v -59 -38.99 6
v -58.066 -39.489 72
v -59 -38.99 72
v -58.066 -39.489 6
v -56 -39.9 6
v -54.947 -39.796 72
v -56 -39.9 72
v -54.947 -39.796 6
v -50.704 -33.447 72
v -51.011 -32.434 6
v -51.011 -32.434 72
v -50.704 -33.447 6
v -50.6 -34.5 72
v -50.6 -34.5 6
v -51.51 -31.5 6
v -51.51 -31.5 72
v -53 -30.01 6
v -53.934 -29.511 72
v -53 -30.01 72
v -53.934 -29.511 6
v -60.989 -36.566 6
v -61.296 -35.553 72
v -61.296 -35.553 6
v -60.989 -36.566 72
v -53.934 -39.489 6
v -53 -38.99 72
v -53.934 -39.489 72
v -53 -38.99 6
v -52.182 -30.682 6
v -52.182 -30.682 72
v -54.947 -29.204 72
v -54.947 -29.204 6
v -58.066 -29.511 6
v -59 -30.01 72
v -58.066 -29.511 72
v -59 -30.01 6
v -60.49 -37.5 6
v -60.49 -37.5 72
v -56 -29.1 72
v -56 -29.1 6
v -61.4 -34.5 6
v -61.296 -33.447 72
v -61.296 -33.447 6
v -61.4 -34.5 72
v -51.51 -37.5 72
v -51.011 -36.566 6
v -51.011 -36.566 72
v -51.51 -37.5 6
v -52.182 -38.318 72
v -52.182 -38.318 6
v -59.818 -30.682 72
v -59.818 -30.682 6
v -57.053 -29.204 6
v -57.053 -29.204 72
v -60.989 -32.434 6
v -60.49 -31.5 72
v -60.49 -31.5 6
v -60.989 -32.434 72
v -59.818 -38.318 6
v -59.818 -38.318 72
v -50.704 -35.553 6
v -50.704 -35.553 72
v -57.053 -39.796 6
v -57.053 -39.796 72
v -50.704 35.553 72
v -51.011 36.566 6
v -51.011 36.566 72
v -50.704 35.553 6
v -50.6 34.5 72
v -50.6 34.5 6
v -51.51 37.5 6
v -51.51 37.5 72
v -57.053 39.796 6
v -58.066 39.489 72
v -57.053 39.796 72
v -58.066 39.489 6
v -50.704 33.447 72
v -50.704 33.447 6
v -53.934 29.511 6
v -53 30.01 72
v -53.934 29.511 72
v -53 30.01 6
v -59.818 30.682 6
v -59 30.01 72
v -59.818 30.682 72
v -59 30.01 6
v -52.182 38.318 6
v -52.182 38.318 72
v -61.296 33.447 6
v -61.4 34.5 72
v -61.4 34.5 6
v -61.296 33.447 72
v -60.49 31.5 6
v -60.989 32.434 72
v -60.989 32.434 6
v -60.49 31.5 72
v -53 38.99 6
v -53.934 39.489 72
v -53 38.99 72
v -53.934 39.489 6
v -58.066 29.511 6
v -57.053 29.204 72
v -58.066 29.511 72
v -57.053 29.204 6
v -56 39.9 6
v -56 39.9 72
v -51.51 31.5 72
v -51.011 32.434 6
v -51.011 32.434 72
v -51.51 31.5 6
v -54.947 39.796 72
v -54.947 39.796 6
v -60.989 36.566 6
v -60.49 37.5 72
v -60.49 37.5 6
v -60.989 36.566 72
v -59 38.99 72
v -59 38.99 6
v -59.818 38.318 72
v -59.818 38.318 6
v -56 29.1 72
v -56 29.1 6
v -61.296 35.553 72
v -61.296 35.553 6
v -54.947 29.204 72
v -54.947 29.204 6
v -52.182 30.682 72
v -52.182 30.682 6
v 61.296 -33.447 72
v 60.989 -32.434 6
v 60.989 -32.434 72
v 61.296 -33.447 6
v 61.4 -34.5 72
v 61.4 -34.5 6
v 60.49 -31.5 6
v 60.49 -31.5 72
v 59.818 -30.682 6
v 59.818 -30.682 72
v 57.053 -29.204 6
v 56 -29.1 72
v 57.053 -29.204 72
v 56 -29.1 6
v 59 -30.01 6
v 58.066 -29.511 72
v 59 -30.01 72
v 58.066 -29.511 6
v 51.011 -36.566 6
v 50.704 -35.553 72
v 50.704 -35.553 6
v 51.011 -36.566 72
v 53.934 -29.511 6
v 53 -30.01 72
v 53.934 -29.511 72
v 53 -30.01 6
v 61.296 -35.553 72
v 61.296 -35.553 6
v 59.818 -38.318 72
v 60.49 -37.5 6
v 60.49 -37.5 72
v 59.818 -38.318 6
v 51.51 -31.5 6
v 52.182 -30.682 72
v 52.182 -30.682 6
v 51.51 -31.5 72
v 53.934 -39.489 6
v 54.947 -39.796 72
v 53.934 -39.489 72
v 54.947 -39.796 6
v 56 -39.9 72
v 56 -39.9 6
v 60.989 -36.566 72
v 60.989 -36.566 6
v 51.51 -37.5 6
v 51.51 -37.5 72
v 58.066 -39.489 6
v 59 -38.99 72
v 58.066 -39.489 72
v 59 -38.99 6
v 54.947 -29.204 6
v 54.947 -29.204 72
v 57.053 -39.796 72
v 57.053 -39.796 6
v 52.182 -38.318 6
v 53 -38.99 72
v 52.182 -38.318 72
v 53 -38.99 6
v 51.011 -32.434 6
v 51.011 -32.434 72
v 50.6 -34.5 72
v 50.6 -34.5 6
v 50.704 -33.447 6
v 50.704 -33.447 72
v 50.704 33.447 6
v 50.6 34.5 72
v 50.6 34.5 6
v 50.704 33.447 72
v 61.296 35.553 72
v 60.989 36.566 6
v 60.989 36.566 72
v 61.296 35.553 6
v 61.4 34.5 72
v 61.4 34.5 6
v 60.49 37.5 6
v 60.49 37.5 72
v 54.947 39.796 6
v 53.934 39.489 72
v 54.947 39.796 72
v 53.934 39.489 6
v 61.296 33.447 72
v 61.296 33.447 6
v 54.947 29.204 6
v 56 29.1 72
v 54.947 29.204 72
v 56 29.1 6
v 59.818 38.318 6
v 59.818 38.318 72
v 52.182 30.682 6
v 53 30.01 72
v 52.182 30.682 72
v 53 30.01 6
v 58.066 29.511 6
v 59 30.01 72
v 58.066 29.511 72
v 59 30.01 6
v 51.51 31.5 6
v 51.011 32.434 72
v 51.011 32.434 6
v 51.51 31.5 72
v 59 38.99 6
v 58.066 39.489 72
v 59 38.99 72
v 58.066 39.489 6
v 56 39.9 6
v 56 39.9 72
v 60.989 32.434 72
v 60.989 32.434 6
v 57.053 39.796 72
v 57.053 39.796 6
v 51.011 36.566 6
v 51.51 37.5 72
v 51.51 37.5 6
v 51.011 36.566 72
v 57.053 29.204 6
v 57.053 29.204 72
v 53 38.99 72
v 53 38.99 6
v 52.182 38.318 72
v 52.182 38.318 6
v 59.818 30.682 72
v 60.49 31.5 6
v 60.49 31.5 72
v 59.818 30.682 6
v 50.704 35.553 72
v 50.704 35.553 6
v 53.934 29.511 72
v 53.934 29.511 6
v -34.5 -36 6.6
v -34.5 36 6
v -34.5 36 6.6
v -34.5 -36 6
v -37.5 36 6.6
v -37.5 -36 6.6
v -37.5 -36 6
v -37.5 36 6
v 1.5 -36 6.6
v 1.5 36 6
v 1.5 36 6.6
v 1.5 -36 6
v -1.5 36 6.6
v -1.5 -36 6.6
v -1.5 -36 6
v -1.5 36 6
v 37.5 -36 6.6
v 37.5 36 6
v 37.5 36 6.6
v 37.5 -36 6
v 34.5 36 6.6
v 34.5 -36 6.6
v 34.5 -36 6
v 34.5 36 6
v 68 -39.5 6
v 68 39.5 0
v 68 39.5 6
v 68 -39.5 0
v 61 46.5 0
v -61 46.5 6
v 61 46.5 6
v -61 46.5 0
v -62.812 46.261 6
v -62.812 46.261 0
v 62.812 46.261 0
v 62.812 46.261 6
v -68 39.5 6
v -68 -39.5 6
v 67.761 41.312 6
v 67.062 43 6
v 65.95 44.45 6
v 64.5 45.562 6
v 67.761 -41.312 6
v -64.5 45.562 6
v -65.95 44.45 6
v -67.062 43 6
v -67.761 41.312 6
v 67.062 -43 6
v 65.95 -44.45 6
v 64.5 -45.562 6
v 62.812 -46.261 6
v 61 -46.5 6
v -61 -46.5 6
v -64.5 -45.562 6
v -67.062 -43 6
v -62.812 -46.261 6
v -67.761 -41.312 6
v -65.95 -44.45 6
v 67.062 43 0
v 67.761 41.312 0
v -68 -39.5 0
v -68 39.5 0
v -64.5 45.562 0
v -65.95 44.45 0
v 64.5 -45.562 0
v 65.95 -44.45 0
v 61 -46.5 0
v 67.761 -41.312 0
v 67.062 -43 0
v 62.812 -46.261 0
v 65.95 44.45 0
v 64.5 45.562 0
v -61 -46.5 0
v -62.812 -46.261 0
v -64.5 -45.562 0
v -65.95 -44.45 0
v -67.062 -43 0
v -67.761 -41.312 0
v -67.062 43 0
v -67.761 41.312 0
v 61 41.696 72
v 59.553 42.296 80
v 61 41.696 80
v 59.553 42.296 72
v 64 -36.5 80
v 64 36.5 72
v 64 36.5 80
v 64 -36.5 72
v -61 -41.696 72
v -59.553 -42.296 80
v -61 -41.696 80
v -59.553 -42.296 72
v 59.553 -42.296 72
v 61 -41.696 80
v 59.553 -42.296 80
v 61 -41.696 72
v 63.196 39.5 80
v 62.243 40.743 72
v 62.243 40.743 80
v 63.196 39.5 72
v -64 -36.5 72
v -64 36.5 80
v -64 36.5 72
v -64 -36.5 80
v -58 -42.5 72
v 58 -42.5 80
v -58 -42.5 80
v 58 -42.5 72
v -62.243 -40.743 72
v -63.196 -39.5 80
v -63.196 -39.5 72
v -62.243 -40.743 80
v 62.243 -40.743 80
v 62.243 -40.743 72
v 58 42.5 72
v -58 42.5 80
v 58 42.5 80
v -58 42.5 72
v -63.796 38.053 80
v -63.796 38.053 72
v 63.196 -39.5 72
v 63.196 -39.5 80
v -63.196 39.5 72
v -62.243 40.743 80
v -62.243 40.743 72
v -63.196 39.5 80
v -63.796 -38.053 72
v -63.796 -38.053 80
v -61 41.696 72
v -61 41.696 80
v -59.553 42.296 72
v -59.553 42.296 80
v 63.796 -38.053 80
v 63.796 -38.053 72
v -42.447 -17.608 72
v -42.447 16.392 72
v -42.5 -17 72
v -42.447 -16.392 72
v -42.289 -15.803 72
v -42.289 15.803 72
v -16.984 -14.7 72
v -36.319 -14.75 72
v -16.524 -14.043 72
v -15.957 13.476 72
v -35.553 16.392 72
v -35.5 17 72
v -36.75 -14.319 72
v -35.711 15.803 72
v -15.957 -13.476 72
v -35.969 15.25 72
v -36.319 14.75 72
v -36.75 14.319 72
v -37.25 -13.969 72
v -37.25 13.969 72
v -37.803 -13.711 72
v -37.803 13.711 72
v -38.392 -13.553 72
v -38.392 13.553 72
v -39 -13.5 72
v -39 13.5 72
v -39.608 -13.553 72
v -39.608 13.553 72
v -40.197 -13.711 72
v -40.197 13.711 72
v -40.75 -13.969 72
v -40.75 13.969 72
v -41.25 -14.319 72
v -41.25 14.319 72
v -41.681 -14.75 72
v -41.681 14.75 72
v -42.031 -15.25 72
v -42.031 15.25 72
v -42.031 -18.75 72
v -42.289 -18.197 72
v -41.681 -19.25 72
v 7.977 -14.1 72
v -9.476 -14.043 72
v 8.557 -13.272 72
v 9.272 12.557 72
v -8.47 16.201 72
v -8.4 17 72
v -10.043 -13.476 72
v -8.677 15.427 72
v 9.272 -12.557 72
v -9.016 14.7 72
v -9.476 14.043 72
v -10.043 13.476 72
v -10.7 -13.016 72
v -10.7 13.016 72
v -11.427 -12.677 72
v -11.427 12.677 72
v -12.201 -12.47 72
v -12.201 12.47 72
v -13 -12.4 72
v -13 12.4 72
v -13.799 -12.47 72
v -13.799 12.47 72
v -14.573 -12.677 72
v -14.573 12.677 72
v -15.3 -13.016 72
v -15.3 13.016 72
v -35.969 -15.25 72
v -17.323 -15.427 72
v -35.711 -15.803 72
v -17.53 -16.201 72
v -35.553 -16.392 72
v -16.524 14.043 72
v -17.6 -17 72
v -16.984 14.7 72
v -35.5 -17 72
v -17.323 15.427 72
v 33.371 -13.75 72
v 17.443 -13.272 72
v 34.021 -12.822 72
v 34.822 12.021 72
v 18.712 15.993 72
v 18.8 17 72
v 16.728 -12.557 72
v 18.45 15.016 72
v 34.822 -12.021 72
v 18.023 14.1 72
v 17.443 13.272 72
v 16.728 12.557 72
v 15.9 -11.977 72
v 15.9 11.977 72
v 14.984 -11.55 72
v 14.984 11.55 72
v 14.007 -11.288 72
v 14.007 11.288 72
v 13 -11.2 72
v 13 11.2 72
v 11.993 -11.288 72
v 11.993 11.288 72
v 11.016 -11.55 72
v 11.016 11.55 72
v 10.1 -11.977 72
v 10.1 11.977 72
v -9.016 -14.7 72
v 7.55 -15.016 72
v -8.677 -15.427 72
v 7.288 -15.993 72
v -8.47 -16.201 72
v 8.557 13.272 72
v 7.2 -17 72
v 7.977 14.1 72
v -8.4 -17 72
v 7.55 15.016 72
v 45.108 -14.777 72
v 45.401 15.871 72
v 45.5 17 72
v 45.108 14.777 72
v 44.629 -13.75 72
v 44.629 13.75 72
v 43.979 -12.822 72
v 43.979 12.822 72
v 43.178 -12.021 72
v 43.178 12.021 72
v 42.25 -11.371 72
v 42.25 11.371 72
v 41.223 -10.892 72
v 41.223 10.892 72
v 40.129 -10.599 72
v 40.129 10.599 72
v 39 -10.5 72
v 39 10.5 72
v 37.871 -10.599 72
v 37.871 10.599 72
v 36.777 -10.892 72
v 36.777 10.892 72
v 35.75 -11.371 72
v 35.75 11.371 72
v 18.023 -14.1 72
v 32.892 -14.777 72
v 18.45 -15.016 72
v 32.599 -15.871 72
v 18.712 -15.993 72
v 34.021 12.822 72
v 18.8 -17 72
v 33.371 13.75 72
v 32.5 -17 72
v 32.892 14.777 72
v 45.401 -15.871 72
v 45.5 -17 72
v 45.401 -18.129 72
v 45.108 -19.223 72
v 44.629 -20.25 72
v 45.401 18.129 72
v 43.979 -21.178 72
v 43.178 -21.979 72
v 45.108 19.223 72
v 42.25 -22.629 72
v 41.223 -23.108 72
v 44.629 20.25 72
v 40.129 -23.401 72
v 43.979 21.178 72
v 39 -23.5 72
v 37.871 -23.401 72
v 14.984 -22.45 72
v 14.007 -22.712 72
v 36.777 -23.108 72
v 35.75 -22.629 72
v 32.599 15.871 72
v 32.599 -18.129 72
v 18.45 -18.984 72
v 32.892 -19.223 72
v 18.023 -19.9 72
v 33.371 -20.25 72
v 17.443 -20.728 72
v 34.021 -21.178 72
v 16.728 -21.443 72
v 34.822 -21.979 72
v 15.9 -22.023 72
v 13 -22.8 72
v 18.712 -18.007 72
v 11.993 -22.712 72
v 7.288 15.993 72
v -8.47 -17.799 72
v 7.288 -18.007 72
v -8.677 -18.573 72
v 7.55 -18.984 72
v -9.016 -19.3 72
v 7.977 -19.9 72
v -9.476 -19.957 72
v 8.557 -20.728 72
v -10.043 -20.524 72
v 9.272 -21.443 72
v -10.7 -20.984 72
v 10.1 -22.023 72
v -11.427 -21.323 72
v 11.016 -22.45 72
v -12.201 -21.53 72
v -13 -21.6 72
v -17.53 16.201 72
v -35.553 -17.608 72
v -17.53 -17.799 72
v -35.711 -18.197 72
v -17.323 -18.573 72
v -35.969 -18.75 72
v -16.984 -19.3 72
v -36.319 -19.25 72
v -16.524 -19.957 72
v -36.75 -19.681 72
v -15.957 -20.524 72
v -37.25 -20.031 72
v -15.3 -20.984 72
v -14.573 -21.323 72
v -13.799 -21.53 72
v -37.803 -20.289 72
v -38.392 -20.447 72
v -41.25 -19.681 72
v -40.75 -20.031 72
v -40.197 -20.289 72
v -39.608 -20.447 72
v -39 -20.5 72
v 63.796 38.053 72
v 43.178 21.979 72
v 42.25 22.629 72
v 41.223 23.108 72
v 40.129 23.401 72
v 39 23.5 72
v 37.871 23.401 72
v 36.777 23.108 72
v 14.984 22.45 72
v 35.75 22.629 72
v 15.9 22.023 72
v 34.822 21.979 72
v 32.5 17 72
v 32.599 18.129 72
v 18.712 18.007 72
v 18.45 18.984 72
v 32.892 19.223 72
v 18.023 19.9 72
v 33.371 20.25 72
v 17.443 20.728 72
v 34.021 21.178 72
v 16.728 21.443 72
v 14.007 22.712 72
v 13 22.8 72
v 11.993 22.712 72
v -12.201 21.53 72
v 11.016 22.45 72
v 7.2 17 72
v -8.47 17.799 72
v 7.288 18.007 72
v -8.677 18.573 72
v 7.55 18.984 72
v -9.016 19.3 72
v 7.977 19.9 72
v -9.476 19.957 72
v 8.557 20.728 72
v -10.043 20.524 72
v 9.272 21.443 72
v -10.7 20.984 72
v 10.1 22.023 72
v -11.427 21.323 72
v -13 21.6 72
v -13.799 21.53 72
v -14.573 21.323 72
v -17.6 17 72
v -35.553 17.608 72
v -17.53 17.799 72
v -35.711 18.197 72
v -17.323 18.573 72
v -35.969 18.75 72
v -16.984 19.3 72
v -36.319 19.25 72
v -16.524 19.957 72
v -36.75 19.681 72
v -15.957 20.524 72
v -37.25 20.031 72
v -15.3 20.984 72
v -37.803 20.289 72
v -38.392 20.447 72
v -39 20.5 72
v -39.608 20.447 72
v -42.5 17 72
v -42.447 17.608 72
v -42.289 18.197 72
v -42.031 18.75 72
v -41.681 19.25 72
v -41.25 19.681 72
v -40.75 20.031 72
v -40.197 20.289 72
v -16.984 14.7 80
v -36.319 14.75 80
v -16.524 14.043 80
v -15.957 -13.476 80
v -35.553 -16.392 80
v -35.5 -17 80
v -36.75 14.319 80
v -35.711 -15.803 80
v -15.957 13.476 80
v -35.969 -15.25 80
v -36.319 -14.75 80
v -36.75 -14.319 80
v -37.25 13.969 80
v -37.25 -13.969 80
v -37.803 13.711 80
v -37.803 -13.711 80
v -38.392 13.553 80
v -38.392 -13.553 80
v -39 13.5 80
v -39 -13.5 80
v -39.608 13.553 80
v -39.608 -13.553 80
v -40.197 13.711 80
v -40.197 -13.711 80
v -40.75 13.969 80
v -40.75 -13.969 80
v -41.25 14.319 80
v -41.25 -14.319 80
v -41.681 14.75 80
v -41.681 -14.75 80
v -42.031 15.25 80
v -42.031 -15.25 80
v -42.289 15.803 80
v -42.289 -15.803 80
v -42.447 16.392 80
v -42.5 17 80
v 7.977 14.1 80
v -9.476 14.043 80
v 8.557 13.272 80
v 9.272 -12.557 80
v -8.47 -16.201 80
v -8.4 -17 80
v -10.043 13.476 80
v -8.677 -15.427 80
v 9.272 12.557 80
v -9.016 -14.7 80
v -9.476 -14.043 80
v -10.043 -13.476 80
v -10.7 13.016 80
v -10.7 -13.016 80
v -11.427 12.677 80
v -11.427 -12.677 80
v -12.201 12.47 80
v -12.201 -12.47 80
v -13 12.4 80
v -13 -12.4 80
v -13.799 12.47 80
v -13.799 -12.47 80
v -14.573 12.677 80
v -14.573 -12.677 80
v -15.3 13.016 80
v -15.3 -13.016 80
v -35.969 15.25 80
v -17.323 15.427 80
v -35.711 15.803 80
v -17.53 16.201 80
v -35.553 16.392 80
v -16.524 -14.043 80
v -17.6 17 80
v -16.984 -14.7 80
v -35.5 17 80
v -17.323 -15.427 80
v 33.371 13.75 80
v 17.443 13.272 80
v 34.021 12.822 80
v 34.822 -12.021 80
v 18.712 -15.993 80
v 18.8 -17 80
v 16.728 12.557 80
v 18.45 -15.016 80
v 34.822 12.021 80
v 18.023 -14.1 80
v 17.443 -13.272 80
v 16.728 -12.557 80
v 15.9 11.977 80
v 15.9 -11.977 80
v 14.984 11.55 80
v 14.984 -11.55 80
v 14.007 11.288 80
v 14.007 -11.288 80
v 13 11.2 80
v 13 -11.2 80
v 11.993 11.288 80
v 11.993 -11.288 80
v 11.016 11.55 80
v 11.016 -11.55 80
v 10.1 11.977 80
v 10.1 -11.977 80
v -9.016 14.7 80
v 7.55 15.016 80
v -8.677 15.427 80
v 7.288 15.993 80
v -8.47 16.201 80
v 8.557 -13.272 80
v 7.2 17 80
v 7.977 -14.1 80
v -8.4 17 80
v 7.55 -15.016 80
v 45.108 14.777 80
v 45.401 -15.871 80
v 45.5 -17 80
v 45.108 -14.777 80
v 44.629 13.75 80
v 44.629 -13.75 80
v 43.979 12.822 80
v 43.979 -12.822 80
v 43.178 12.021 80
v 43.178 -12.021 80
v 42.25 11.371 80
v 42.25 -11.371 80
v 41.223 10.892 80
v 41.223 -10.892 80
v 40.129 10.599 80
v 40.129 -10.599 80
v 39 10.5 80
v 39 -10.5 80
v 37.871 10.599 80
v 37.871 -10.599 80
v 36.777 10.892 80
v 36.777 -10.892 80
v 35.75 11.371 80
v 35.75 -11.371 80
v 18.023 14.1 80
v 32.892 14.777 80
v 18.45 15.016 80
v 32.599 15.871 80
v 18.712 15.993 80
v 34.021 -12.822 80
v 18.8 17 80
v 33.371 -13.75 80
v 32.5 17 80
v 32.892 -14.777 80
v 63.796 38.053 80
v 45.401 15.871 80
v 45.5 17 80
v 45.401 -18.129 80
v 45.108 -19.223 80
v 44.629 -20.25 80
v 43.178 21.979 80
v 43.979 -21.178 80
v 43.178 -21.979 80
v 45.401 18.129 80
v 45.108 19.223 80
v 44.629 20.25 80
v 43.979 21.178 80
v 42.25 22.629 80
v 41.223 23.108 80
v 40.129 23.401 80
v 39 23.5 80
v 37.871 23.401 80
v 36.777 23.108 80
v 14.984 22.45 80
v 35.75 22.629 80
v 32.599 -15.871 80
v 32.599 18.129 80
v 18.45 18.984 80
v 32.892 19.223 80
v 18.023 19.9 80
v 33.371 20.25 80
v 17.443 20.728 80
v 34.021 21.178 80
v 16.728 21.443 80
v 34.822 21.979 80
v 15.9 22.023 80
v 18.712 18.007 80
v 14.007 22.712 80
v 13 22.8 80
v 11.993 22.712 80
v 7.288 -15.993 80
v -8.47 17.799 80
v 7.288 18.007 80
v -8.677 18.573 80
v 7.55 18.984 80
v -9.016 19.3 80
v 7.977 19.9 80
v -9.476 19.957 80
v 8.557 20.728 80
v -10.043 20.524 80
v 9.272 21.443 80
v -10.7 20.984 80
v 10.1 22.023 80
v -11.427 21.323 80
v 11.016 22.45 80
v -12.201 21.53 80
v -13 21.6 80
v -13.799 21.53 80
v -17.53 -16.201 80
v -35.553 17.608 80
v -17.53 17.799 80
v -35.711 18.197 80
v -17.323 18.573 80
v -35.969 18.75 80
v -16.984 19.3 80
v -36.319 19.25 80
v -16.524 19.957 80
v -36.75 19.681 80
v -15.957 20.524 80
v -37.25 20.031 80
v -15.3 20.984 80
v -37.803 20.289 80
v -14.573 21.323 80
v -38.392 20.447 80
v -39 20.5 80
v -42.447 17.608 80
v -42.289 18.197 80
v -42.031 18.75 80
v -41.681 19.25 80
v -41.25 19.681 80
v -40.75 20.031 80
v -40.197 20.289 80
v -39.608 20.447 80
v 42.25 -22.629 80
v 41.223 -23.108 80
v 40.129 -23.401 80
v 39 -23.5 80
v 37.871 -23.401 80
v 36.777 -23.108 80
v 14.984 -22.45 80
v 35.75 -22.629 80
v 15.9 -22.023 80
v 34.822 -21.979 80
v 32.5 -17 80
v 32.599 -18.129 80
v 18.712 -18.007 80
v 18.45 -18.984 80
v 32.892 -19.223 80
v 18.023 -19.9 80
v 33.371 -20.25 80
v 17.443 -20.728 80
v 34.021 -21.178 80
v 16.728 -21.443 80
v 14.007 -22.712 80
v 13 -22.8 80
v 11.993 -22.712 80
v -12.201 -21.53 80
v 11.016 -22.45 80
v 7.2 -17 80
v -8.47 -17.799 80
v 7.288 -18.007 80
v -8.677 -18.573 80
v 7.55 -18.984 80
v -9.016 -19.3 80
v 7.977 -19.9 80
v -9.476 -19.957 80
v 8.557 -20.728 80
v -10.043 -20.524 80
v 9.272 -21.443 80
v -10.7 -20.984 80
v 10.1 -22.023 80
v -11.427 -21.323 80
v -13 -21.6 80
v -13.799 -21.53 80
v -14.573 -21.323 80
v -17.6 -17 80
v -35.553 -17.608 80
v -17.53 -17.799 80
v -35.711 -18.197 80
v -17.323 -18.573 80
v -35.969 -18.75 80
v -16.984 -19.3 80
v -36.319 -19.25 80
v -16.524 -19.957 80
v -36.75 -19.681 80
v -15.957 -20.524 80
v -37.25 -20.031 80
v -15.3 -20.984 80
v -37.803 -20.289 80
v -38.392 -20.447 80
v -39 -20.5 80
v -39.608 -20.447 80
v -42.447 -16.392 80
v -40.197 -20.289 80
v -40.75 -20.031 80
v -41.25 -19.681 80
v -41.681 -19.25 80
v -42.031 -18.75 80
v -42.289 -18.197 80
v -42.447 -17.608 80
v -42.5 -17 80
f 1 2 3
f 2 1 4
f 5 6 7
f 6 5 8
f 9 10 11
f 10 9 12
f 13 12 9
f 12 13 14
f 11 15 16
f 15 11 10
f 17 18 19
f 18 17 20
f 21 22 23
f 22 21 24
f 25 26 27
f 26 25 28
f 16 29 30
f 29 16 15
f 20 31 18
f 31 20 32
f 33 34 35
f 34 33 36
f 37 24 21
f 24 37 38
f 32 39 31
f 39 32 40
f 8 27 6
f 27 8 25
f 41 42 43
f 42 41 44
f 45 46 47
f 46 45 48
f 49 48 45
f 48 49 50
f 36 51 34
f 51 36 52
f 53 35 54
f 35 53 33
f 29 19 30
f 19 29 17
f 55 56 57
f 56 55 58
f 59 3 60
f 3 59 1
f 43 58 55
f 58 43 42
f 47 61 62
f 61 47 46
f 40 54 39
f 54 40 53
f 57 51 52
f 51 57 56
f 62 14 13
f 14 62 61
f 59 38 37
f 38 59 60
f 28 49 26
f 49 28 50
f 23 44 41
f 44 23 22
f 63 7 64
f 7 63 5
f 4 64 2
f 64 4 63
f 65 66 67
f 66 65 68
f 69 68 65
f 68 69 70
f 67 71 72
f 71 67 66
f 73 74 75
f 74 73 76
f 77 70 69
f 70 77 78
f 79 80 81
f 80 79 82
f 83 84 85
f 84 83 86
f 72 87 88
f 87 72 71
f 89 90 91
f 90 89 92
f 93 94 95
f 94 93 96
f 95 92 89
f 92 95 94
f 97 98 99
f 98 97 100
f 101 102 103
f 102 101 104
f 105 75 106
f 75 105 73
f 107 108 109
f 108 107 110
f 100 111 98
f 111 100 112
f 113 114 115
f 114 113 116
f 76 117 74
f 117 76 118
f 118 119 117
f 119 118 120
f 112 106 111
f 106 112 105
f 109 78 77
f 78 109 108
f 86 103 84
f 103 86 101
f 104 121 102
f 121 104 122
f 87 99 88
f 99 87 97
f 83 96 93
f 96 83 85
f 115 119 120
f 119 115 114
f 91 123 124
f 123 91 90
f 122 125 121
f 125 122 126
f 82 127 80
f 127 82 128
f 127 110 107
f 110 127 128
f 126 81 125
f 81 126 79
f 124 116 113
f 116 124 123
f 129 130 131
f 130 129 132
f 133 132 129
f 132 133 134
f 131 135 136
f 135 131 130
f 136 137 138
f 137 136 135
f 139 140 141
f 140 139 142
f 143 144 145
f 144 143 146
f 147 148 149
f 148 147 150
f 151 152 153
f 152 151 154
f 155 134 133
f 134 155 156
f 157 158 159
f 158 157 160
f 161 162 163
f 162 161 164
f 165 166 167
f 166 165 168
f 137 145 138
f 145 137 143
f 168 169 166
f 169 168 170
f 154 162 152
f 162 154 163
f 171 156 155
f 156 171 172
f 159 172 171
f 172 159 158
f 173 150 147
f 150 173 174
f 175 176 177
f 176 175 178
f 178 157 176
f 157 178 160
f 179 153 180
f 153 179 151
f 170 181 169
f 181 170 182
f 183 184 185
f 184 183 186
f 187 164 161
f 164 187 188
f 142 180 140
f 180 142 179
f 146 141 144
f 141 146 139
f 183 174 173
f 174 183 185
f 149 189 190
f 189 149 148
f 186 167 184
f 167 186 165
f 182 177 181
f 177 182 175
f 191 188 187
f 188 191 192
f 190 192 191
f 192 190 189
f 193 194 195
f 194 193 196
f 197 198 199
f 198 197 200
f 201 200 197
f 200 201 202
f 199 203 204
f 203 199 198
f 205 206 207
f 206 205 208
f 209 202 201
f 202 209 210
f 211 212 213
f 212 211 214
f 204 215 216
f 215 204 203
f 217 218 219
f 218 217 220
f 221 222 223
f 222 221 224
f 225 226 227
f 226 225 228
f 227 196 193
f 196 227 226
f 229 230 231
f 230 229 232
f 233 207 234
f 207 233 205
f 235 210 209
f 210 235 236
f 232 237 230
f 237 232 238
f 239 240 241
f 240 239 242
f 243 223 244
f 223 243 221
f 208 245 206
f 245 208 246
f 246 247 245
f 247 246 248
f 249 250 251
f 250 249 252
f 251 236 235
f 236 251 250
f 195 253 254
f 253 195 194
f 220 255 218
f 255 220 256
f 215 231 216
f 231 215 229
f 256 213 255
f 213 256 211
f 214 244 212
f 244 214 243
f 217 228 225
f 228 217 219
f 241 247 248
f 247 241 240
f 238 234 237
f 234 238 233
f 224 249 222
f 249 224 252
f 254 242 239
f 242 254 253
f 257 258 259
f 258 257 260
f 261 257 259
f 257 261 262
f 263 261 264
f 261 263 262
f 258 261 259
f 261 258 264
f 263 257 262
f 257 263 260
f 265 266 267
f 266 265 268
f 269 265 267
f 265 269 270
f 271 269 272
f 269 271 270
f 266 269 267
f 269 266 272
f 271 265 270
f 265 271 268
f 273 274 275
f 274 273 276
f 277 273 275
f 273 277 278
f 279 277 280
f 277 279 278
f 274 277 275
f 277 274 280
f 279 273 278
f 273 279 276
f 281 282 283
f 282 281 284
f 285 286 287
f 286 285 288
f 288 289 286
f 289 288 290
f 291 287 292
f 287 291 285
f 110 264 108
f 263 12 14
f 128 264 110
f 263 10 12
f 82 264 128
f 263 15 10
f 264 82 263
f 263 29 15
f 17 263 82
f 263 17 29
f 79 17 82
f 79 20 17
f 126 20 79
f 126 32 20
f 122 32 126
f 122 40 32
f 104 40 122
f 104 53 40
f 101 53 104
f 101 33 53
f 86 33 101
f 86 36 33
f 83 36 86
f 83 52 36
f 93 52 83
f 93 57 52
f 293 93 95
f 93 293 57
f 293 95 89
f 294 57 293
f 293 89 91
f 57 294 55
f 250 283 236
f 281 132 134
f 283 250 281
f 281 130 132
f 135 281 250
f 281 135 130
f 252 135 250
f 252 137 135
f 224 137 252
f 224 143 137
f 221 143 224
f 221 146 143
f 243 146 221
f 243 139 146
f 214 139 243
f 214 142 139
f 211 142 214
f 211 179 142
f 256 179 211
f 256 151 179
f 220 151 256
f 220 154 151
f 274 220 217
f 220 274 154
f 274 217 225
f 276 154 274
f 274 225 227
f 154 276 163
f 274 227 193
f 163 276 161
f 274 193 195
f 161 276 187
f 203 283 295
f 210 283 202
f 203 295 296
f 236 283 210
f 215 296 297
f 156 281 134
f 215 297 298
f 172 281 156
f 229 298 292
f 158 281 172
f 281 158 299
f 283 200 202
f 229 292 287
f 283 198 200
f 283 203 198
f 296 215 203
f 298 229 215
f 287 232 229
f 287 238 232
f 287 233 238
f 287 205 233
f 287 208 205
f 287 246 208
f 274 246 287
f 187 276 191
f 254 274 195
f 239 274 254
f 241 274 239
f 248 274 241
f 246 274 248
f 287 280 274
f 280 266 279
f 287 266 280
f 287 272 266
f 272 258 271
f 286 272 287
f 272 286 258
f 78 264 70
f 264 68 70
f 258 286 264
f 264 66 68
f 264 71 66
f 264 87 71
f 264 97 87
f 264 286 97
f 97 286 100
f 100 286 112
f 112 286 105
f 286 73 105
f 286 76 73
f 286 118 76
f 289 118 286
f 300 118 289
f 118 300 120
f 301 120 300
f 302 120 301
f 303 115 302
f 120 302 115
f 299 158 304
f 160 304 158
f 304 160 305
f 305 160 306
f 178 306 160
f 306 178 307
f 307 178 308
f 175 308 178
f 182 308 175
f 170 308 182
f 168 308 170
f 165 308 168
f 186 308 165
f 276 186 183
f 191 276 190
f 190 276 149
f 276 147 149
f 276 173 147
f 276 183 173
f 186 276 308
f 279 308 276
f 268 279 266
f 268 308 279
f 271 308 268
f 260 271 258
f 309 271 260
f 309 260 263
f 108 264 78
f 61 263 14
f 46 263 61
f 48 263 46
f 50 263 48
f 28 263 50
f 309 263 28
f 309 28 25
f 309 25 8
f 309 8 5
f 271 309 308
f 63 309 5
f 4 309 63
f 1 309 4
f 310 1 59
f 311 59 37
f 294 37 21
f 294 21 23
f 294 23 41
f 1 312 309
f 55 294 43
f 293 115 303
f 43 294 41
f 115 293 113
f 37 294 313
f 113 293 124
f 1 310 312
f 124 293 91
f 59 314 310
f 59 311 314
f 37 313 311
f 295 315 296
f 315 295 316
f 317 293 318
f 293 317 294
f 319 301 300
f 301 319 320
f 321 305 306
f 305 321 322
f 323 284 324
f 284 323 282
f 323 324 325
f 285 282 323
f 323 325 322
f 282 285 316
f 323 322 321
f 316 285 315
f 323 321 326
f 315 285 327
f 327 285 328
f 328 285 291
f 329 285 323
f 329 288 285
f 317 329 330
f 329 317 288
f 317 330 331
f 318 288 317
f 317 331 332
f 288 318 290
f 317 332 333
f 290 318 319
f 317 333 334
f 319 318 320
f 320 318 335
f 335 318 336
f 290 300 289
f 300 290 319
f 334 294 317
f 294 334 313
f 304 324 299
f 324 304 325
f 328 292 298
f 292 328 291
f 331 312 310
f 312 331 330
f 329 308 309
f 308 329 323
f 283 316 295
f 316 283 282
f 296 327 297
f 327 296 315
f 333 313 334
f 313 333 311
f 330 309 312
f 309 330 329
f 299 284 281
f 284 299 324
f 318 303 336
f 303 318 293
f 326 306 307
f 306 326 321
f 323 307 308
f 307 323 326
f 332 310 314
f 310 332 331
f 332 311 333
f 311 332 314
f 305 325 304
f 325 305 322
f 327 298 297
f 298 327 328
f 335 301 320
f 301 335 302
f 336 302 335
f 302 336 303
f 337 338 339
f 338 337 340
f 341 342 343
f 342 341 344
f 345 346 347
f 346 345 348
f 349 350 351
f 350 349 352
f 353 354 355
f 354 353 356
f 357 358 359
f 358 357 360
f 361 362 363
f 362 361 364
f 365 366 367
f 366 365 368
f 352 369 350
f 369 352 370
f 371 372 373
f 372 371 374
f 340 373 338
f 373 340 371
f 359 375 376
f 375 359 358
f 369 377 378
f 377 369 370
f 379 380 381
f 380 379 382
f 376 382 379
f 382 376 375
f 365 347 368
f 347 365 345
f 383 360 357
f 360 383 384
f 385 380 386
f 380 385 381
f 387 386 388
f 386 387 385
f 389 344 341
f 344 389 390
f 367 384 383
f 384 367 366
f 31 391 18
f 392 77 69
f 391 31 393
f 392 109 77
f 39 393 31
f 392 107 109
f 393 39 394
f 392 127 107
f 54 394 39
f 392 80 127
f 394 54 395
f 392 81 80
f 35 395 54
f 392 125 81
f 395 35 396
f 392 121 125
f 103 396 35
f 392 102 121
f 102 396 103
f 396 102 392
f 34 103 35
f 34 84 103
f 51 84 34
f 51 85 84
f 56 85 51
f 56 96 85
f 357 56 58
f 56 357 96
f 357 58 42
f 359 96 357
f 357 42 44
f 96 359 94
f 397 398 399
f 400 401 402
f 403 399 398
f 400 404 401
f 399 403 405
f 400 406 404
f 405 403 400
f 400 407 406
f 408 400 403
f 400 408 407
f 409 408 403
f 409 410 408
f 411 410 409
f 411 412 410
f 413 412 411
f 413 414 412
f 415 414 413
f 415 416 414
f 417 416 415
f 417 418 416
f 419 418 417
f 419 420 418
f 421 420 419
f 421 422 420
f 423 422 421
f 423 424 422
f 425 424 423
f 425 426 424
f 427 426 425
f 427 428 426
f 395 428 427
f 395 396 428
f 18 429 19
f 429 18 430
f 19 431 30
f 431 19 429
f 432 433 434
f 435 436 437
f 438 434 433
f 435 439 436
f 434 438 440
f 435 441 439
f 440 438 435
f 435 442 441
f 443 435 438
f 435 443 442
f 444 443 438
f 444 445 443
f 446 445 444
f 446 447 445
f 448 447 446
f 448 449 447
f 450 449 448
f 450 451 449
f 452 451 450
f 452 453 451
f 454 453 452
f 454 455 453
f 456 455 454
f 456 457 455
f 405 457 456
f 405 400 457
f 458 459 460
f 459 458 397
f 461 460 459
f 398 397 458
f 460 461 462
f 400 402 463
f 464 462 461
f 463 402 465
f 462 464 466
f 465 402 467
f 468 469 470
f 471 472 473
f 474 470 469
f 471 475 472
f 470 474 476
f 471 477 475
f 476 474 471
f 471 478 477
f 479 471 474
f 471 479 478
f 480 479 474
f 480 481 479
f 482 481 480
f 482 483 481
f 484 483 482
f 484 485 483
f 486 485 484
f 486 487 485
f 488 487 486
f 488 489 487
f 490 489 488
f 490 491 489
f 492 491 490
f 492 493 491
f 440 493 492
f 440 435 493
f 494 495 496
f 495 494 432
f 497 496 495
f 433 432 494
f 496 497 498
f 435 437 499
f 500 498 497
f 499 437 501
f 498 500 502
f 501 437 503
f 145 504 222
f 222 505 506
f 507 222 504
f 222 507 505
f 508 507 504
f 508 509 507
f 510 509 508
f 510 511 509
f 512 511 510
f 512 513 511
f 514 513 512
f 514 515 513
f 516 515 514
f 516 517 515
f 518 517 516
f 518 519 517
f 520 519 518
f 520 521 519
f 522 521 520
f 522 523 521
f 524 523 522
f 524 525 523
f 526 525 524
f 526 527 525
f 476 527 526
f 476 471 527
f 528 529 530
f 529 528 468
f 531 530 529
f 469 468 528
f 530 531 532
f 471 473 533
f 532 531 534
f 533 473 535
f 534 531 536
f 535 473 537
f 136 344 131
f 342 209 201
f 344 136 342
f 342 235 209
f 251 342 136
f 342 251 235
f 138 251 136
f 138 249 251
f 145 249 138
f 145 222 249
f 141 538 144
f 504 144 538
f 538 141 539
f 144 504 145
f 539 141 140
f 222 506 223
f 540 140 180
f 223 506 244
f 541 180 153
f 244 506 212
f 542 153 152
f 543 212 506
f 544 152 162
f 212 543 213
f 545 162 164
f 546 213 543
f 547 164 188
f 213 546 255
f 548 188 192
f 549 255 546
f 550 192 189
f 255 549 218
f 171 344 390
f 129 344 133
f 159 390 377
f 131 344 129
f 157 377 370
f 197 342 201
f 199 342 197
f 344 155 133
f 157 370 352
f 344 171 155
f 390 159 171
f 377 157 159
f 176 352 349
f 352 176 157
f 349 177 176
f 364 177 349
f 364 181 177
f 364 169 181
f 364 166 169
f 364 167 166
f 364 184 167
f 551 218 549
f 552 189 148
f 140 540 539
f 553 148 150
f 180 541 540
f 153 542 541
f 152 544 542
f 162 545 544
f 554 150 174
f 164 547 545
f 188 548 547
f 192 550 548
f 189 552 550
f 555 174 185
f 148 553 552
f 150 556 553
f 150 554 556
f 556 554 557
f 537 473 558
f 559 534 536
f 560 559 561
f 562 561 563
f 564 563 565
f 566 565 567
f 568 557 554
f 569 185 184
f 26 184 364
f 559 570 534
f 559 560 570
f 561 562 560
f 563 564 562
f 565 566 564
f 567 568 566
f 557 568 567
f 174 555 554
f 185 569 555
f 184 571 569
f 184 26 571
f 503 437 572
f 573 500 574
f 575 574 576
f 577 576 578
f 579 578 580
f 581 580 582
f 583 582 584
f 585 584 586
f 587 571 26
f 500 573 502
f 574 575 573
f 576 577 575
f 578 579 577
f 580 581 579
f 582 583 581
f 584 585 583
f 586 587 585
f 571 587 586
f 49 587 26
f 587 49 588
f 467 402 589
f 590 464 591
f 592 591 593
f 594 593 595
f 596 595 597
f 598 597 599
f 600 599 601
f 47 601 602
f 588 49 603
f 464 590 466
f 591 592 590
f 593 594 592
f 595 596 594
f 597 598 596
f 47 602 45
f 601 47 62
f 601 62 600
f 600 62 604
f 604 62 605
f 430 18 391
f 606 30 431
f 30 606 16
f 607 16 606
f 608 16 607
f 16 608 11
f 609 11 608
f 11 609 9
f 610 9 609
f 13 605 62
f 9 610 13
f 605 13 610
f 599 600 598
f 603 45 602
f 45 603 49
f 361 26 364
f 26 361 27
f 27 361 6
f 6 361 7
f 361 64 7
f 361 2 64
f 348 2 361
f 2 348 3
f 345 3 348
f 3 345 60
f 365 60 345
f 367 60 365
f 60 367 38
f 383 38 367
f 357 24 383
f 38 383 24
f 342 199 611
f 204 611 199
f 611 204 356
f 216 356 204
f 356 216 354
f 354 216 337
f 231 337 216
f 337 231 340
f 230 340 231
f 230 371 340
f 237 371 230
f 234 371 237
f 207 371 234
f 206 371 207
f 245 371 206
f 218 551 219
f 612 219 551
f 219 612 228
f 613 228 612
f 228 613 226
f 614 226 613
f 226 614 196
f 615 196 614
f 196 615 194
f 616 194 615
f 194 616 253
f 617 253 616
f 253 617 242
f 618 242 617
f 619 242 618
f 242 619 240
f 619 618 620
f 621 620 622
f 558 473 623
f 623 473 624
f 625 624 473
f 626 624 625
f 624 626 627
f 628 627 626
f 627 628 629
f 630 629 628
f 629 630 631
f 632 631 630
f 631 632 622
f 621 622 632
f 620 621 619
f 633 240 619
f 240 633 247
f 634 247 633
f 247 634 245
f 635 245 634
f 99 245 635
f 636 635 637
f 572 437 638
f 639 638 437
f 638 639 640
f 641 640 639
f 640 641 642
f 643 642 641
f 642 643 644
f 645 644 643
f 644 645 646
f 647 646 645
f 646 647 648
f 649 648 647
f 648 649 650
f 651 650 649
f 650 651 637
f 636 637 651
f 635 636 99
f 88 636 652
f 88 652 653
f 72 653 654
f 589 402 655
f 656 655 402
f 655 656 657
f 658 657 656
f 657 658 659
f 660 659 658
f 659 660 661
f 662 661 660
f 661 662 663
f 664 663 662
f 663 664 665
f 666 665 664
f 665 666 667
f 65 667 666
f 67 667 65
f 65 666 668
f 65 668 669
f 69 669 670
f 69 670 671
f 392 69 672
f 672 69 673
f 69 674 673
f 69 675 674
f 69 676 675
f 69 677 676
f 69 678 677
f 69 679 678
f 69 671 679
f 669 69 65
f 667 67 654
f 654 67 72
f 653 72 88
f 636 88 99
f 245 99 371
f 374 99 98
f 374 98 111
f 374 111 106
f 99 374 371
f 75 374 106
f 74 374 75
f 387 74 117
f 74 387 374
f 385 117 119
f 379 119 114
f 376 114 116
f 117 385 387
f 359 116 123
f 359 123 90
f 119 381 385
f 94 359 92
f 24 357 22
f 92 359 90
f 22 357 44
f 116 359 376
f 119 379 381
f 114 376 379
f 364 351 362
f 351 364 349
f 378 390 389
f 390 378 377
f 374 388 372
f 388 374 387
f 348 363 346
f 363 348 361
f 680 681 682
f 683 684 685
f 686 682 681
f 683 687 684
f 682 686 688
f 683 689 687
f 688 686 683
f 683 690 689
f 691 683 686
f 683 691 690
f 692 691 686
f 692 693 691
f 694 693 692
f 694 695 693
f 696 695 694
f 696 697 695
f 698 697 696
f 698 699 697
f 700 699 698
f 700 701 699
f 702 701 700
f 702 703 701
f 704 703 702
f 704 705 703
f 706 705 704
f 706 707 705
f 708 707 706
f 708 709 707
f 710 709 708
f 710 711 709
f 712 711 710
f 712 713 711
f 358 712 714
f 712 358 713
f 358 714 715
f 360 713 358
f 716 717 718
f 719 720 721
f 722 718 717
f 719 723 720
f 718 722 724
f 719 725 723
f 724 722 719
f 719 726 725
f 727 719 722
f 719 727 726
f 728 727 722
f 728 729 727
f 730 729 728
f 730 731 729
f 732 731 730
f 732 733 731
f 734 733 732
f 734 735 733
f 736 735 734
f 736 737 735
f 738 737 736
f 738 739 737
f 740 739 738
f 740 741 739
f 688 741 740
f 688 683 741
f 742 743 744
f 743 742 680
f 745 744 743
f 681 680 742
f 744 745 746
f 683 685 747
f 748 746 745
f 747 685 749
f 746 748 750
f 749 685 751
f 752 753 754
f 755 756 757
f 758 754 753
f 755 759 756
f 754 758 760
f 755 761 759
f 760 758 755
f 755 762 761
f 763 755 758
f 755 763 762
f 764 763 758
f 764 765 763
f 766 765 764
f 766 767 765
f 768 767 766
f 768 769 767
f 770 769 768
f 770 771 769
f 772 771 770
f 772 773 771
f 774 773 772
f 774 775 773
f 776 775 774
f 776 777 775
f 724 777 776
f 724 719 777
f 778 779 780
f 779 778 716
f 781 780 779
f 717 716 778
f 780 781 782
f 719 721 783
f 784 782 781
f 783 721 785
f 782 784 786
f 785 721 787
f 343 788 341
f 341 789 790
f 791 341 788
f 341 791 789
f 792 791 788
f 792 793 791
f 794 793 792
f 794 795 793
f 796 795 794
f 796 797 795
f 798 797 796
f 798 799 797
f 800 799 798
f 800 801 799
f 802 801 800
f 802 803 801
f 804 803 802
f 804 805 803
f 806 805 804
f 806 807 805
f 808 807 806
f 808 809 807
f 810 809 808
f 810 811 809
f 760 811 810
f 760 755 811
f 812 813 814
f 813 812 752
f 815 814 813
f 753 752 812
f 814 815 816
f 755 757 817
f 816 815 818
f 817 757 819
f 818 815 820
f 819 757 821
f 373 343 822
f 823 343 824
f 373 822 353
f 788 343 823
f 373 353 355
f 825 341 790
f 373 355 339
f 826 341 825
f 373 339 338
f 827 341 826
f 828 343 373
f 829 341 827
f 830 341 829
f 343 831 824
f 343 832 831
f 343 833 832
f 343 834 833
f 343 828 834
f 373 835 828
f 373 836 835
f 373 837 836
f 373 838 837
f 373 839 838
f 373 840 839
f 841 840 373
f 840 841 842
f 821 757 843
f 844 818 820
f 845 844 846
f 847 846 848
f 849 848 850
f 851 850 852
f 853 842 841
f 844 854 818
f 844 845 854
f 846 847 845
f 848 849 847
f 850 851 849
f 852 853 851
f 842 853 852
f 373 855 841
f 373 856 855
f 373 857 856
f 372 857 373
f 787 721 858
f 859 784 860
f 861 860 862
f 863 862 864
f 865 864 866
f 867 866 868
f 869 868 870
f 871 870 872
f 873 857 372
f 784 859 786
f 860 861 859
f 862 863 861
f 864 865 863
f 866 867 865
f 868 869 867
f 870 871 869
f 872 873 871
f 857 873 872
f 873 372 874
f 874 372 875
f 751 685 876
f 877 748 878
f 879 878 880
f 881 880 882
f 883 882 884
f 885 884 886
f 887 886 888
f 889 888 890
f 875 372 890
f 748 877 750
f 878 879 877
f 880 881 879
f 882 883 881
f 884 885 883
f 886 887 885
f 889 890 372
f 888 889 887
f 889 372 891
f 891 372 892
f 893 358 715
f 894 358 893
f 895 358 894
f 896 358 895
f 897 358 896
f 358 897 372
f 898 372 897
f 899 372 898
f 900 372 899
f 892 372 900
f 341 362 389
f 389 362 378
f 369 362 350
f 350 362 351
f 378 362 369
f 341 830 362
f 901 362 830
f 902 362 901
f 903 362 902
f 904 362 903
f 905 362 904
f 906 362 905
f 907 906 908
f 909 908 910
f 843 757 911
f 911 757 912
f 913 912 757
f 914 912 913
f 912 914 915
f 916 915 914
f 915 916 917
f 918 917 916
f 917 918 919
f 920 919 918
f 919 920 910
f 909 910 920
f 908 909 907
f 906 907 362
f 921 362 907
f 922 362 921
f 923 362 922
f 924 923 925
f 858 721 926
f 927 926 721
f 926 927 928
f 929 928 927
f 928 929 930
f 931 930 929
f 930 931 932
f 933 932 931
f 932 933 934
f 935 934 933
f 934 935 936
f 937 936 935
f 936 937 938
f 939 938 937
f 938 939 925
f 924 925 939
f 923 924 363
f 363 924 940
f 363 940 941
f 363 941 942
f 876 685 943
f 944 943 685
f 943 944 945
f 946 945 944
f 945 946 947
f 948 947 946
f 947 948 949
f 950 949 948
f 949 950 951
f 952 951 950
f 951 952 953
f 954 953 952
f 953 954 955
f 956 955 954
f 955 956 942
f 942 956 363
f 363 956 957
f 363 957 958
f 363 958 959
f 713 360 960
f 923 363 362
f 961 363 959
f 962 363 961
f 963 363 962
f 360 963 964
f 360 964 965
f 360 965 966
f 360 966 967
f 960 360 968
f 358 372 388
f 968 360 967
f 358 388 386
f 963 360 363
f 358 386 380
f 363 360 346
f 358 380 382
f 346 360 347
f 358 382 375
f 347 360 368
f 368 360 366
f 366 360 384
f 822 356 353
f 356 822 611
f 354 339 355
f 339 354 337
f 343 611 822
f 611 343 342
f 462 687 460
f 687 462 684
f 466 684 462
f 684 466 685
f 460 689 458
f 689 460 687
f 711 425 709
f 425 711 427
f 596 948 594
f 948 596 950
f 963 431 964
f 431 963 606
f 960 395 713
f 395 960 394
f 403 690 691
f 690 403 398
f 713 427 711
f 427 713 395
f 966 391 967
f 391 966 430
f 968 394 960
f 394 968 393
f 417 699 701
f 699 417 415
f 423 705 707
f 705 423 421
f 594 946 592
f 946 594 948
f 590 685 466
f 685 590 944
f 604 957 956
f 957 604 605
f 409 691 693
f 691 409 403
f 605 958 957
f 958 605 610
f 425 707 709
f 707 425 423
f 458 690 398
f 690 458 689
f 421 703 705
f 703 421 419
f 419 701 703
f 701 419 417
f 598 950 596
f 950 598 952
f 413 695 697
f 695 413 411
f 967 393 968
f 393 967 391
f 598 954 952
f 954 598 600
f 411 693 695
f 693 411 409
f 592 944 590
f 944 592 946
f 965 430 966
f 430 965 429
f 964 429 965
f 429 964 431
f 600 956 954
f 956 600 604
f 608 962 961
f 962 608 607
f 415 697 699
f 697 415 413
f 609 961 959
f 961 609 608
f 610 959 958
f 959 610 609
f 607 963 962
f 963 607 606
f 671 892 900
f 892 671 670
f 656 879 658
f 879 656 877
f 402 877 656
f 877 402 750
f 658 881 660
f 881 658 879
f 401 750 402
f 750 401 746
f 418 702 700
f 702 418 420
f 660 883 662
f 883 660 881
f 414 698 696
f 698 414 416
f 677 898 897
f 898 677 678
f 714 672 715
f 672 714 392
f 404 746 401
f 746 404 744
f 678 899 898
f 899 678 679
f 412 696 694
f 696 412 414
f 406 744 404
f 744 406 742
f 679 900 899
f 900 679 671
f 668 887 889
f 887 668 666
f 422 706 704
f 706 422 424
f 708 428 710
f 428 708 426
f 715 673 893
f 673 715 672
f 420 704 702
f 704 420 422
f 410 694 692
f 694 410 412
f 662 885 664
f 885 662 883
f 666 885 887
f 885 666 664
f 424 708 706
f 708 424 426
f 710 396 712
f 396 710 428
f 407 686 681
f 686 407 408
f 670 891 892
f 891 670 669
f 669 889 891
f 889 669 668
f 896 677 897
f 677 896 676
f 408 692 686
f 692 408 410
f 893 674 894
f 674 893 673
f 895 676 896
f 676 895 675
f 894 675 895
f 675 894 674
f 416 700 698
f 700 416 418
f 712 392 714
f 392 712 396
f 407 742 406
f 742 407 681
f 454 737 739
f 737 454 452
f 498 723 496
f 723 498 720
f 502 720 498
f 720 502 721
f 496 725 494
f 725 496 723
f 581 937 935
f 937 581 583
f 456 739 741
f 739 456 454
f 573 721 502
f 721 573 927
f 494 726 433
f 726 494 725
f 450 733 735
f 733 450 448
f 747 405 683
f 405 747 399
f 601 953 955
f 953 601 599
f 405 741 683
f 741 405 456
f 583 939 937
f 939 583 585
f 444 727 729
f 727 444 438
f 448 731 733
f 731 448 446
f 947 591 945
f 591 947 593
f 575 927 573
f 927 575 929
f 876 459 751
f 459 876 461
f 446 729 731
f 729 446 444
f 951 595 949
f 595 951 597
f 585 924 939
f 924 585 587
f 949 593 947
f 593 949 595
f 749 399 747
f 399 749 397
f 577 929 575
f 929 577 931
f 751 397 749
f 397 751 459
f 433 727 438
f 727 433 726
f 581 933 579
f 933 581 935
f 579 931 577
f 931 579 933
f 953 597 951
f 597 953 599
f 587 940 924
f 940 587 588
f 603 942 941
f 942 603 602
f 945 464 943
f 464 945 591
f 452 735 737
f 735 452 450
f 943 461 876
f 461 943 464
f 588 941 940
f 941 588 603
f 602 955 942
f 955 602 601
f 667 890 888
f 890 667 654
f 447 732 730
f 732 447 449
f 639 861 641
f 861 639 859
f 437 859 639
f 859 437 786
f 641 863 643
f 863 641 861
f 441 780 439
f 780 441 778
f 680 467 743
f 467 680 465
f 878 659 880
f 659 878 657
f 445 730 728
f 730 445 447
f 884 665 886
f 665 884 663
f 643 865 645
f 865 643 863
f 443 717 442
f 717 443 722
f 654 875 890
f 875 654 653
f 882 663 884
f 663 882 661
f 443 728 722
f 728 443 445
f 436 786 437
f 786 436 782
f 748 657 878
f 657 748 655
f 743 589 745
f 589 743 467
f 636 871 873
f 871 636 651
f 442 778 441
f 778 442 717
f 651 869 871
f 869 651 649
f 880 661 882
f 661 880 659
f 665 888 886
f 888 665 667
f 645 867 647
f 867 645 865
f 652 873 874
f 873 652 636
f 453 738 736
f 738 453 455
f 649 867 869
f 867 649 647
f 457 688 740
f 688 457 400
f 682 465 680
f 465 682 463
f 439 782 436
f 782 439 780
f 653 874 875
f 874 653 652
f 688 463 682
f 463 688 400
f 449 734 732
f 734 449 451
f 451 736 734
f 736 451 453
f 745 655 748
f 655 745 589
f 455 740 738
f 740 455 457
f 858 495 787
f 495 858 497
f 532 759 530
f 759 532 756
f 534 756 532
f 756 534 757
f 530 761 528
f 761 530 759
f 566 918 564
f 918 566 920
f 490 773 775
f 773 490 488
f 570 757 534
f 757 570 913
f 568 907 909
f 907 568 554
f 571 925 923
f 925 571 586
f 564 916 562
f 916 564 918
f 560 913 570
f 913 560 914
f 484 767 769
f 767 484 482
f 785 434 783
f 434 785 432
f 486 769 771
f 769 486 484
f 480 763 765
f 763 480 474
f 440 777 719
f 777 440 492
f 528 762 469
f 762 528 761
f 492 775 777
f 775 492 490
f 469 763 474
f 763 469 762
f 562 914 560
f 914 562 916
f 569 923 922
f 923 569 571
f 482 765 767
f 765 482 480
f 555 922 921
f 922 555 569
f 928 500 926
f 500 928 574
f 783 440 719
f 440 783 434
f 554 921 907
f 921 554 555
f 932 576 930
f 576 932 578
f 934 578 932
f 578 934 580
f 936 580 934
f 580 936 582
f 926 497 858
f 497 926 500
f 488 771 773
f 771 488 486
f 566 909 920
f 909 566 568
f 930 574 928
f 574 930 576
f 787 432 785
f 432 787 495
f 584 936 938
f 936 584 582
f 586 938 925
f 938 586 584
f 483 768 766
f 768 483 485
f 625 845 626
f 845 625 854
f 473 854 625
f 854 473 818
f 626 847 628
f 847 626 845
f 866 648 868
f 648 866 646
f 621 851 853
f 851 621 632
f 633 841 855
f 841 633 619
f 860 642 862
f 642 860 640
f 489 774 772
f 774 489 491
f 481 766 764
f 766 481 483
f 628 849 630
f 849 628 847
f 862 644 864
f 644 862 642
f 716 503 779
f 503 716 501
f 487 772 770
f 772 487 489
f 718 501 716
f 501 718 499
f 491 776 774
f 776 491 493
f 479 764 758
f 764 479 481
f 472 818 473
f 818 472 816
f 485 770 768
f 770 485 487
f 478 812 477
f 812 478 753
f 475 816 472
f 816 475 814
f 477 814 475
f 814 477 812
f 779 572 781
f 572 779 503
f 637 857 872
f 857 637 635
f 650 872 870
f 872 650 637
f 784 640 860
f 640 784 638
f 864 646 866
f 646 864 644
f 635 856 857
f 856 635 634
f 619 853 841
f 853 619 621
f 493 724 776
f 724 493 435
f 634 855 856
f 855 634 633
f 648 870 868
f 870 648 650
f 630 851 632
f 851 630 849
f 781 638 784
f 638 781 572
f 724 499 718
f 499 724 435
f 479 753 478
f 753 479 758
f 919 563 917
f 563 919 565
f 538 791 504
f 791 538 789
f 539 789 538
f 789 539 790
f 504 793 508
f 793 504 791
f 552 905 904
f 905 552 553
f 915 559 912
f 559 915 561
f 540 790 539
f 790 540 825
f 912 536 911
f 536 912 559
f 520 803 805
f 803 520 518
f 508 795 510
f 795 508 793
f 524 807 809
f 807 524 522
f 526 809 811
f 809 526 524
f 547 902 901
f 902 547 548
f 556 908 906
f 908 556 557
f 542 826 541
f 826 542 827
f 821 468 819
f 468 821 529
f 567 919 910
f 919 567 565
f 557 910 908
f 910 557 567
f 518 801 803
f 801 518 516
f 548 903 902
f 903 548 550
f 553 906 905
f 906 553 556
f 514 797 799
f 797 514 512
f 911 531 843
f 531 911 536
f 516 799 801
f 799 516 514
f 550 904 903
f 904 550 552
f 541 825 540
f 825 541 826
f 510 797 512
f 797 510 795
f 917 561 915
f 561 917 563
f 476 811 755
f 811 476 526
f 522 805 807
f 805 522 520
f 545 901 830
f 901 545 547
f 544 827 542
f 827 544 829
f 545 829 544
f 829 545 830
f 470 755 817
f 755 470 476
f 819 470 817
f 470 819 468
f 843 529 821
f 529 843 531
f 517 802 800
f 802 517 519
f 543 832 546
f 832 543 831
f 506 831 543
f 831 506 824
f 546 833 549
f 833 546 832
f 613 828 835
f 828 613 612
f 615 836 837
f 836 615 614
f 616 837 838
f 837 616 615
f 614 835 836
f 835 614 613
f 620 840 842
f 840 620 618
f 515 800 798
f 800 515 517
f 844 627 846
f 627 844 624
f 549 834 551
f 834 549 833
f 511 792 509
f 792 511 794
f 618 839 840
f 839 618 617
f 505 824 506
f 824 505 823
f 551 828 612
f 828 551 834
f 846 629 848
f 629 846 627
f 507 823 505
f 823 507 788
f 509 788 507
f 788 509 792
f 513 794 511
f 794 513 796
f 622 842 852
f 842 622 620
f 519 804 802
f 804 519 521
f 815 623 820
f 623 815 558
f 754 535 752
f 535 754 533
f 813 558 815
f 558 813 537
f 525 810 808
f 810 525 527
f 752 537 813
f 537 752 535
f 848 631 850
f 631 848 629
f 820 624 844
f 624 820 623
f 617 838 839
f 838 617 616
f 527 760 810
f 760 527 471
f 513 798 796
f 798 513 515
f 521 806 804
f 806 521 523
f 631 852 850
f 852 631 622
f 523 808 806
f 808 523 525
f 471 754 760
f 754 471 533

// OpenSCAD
// SPDX-License-Identifier: MIT
// Paintbrush Workshop Rack | Refined batch 01 | OpenSCAD mm/Z-up.
// Prototype: slicer, fit, material, stability and safety remain UNVERIFIED.
use <lib/commerce_forms.scad> // v1.3 compatibility; other SKUs retain their original template.
use <lib/refined_forms.scad>
width_mm = 136;
depth_mm = 93;
height_mm = 80;
refined_form(slug="paintbrush-workshop-rack", family="organizer", variant=3, w=width_mm, d=depth_mm, h=height_mm);
